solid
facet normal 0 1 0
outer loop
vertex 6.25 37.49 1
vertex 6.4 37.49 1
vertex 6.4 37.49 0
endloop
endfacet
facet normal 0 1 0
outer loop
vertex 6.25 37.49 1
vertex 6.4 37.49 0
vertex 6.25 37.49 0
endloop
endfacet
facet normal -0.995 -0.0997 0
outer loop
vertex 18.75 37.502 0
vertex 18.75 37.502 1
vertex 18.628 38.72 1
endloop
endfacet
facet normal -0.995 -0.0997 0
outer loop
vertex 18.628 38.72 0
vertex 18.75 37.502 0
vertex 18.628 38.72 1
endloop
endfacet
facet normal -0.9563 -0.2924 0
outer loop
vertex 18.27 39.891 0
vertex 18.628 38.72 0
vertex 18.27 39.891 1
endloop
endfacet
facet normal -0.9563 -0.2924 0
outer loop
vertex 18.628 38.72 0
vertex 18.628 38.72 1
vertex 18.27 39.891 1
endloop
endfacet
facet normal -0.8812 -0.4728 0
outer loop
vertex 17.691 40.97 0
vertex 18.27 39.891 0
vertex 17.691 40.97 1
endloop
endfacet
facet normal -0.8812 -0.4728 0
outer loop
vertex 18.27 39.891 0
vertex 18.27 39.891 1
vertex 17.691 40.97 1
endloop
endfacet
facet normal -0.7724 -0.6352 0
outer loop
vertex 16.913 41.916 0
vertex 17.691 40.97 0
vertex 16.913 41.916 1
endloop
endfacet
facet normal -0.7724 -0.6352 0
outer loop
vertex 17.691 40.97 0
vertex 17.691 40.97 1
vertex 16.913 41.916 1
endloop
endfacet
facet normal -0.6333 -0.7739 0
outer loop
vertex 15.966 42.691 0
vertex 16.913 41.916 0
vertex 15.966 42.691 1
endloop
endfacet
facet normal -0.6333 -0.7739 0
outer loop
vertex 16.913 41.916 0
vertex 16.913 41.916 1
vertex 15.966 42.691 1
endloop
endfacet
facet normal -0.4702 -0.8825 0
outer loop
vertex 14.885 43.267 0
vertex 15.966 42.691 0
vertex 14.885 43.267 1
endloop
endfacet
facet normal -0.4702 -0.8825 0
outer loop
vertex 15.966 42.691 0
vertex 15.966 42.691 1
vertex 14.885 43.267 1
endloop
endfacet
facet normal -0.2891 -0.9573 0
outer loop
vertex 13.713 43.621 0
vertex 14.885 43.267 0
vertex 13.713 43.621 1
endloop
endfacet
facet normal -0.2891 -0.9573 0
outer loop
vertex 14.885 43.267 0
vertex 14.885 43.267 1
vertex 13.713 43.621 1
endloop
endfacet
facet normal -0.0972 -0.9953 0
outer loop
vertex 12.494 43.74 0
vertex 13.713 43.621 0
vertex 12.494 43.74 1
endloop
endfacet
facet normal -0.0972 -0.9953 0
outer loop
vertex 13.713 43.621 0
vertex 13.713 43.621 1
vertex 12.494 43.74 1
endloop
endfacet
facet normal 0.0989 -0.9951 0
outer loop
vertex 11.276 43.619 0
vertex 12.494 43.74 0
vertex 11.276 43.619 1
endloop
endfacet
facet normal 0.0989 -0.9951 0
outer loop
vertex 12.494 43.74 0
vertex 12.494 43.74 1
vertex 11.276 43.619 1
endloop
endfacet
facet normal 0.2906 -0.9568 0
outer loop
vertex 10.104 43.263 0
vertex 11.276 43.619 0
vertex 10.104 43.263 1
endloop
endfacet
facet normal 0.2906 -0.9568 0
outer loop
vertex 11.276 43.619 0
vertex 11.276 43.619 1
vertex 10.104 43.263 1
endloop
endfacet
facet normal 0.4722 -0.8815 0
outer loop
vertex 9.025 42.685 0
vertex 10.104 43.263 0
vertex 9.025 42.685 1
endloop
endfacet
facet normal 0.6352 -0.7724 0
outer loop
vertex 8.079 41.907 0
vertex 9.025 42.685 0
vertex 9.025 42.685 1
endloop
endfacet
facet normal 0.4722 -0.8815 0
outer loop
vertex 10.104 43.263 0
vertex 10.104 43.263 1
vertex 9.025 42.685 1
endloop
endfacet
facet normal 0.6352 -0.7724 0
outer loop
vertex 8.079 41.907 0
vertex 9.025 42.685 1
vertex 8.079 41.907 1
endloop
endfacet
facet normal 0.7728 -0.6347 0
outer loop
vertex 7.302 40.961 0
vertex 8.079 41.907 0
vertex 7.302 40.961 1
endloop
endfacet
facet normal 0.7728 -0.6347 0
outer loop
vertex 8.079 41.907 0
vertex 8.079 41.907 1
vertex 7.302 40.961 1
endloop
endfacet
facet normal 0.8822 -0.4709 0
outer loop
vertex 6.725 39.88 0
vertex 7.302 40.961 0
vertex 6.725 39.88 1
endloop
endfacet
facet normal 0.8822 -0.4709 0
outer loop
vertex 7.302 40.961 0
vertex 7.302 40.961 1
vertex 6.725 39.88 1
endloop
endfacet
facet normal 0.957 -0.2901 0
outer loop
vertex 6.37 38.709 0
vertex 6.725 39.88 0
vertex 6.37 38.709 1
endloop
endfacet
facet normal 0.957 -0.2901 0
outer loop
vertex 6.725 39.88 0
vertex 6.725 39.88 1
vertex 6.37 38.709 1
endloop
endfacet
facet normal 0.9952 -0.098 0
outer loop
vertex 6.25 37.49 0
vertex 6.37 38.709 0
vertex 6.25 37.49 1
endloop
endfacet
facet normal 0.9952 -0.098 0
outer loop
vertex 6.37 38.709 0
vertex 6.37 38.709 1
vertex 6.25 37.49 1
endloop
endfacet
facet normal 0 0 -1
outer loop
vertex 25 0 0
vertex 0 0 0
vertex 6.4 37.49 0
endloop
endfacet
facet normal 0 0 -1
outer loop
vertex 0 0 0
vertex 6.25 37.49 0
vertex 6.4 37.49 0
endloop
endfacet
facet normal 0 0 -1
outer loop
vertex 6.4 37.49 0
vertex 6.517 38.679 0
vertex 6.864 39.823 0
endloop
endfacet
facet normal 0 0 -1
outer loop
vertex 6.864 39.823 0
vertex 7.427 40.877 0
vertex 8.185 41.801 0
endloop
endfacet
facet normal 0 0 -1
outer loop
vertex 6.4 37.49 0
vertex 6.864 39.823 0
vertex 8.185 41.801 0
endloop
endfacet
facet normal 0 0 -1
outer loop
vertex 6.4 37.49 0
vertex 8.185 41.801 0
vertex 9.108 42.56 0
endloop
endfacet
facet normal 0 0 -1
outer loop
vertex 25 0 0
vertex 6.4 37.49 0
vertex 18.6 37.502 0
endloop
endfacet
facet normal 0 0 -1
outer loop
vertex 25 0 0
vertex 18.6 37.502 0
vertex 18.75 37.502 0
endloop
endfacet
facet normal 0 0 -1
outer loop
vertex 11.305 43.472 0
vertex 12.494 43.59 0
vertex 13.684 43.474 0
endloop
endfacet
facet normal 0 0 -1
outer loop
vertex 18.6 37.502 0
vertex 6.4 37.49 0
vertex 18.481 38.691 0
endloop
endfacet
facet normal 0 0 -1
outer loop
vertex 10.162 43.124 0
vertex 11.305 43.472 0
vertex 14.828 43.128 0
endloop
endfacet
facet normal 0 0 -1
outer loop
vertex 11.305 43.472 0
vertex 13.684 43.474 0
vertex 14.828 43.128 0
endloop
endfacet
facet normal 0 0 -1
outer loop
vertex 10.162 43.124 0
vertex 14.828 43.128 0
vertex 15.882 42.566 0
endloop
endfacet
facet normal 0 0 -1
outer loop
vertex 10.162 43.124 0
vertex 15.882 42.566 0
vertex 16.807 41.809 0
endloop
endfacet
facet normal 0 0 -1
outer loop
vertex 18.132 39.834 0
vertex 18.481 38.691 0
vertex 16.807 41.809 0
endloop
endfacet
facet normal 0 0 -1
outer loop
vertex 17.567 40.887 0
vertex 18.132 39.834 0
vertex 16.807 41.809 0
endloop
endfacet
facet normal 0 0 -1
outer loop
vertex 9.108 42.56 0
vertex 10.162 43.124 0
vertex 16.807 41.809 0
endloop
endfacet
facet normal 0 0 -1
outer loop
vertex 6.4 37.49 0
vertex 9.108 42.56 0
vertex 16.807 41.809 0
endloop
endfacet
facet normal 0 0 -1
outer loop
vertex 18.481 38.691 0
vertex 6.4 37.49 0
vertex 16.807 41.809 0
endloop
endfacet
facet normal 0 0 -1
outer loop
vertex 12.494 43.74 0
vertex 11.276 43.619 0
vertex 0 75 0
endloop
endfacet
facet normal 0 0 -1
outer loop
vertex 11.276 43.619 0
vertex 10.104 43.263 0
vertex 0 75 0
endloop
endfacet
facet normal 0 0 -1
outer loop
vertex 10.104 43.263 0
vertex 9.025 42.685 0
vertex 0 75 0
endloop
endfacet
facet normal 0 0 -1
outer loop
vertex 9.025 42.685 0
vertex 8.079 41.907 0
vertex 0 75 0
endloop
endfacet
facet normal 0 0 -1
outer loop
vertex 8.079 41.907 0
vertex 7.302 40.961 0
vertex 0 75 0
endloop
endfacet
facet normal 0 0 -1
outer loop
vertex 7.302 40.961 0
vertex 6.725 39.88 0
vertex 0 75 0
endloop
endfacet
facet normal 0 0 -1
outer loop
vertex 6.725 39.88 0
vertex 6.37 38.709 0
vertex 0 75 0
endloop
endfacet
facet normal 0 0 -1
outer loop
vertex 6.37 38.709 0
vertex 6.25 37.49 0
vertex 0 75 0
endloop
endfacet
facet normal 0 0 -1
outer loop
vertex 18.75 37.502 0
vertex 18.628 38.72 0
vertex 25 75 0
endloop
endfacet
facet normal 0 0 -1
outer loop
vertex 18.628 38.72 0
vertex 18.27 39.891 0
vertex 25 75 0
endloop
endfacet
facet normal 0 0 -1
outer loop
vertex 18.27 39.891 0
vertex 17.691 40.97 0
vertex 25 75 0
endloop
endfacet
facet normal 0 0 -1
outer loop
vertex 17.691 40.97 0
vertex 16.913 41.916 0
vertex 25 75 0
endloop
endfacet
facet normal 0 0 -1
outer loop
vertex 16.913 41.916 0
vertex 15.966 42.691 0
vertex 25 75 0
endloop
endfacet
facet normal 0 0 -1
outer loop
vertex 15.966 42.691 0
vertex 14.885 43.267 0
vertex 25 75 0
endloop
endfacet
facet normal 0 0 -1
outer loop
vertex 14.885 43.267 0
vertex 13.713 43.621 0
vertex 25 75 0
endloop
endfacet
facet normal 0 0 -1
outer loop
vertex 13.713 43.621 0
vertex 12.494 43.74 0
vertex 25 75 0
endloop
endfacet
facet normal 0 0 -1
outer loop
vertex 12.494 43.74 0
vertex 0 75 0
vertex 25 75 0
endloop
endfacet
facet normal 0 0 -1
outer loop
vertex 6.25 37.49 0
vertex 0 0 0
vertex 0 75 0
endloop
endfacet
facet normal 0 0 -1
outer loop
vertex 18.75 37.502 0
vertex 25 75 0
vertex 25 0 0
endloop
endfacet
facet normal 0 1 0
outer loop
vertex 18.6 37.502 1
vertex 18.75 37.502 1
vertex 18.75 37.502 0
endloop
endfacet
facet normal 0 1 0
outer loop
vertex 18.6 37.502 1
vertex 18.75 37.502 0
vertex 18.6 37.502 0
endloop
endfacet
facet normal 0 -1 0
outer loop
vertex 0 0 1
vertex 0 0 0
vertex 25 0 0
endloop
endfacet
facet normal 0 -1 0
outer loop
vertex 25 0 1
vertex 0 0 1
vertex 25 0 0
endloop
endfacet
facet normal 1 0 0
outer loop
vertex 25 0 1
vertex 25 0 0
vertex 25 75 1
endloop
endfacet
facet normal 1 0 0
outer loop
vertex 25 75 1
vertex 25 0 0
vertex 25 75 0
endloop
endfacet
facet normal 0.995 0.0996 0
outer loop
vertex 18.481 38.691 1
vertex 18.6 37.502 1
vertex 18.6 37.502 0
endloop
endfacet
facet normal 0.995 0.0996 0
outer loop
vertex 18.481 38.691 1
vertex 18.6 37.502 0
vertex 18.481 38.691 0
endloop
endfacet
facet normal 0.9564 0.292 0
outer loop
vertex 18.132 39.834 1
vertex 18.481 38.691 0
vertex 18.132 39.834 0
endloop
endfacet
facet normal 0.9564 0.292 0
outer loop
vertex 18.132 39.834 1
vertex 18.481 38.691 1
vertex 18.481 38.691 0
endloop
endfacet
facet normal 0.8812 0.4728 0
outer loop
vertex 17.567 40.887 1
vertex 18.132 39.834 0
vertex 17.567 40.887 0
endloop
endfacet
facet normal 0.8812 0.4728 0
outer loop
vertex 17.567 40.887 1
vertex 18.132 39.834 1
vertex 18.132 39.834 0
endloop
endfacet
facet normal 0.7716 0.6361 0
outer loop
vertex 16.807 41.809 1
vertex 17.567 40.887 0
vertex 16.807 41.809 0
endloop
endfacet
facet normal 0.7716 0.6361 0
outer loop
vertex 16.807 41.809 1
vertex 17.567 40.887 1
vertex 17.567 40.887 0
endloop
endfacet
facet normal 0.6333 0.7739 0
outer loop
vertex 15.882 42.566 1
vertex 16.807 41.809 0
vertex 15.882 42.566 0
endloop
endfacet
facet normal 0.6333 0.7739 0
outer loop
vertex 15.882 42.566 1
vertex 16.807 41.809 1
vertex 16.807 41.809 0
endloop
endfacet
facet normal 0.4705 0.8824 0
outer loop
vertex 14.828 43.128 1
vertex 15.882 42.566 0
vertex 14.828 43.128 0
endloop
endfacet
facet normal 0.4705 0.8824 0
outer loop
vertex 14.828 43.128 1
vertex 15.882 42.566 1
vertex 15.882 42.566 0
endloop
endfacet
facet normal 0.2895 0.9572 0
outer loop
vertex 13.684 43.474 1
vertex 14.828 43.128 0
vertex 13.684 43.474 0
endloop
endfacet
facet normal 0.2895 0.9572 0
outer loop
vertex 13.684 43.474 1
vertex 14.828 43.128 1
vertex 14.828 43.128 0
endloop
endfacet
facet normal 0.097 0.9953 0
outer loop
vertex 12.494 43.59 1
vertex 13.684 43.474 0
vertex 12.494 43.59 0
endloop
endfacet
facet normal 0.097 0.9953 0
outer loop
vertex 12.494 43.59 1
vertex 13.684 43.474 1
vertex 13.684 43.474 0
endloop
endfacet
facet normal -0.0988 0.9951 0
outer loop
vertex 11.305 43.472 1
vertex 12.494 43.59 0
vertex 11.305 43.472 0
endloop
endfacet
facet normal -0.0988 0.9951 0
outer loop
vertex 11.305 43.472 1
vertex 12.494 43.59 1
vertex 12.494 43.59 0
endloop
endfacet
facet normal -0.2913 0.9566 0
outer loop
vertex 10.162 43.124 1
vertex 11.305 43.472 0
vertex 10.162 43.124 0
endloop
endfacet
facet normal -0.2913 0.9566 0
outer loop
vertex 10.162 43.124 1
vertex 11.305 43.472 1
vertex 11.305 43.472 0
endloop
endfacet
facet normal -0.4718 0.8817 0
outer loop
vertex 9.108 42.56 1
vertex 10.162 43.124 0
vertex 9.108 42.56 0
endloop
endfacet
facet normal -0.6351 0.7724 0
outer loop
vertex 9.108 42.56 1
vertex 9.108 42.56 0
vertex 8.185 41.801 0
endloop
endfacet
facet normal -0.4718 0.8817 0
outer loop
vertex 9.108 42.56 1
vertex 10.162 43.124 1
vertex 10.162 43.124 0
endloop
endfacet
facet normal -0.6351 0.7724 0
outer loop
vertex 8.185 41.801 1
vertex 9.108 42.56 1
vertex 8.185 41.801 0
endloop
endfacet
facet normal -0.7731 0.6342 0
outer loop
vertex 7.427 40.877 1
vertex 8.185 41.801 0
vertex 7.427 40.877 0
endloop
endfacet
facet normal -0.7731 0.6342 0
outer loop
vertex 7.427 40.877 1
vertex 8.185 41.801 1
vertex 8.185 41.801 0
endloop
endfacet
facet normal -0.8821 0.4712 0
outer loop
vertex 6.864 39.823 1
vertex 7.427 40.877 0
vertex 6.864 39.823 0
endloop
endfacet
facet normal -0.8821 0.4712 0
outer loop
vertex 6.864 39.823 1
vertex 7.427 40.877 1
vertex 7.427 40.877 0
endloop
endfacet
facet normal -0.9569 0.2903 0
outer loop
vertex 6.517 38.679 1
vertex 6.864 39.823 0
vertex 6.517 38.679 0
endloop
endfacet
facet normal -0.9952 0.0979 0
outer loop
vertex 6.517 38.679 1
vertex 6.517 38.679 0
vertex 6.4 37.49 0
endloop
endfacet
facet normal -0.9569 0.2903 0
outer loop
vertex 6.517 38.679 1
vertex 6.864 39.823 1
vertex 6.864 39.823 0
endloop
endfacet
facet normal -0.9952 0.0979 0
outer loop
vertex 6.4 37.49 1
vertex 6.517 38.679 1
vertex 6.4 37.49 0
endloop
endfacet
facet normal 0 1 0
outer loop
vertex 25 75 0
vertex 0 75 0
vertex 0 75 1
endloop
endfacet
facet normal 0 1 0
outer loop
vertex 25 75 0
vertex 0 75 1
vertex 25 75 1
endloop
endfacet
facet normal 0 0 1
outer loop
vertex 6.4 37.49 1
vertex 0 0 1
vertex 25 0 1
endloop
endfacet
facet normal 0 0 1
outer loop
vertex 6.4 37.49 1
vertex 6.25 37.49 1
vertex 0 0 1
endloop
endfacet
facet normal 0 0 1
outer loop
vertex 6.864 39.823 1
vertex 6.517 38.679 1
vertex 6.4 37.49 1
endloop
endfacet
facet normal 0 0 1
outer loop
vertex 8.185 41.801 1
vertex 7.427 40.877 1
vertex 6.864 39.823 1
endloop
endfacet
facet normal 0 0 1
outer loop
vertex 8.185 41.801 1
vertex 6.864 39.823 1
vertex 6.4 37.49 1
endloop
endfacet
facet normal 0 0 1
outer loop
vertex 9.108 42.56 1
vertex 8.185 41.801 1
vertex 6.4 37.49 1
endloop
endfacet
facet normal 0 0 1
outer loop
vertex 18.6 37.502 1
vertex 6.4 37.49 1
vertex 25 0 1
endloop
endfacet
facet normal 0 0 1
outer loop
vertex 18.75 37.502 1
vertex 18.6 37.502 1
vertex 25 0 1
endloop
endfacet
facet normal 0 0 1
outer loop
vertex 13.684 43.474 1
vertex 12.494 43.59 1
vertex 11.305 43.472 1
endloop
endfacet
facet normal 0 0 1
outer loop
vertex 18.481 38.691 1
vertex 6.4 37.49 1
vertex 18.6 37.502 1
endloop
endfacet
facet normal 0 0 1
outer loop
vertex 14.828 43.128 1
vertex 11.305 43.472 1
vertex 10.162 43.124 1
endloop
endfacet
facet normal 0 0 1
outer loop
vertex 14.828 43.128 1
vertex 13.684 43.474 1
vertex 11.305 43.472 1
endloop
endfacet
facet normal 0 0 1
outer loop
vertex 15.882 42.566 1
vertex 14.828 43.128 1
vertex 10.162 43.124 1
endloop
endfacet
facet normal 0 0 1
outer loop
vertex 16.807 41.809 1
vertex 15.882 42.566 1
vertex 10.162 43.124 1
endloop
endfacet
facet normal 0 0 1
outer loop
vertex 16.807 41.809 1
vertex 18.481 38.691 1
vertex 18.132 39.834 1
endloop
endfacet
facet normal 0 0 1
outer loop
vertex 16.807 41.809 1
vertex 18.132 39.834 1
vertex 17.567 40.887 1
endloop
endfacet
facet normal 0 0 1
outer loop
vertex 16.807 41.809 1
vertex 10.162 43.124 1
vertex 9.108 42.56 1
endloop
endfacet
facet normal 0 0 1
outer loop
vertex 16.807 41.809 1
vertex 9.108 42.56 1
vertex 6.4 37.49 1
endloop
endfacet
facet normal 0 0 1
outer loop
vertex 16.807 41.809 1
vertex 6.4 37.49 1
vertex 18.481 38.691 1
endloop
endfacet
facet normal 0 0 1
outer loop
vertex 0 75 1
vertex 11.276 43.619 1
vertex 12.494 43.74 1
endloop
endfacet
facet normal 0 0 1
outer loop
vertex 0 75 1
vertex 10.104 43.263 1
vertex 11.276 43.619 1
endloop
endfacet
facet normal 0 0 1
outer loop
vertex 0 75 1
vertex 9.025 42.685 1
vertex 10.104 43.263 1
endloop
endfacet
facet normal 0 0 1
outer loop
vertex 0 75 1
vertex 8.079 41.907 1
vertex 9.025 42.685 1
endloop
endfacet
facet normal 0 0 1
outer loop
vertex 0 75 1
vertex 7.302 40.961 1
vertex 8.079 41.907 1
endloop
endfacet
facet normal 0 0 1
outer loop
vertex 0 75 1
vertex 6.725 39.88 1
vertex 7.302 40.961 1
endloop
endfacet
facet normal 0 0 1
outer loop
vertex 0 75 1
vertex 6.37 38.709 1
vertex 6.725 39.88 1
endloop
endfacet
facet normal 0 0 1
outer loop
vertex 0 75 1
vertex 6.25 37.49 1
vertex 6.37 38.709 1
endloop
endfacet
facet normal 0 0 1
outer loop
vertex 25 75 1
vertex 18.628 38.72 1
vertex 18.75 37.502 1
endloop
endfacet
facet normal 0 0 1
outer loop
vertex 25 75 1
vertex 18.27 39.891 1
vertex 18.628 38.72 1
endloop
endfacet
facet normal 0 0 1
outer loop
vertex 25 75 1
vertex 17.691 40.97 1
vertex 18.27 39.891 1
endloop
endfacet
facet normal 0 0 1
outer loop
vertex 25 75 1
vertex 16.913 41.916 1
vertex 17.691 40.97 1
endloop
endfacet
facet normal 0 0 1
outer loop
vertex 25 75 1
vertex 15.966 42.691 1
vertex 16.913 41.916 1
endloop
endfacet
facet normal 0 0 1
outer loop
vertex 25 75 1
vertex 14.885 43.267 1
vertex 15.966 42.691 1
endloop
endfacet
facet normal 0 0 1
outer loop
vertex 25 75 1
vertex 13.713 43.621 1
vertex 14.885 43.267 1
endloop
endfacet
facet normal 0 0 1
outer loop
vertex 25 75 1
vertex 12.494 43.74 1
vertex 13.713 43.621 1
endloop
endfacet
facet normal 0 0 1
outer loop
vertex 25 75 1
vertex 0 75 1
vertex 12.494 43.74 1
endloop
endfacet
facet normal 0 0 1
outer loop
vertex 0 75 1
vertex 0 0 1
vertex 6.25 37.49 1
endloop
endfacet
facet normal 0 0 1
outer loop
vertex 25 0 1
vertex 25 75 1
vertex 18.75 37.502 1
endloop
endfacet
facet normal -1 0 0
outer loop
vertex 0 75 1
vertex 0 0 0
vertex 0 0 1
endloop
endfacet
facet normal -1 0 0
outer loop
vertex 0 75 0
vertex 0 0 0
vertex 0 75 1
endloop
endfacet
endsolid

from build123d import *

# Parameters (mm, degrees)
PAD004_DEPTH      = 2
PAD004_DEPTH_BACK = 2
SKETCH020_W       = 25
SKETCH020_H       = 75
PAD019_DEPTH      = 1


with BuildPart() as body004:
    # Sketch005 → Pad004 (new body, two sides)
    with BuildSketch(Plane.XY) as pad004_sk:
        with BuildLine():
            ThreePointArc((18.749989, 37.50156), (12.49422, 43.740026), (6.25, 37.49))
            Line((6.4, 37.49), (6.25, 37.49))
            ThreePointArc((18.599989, 37.50156), (12.49422, 43.590026), (6.4, 37.49))
            Line((18.749989, 37.50156), (18.599989, 37.50156))
        make_face()
    extrude(amount=PAD004_DEPTH)
    extrude(pad004_sk.sketch, amount=-PAD004_DEPTH_BACK)


with BuildPart() as body018:
    # Sketch020 → Pad019 (new body)
    with BuildSketch(Plane.XY):
        with Locations((12.5, 37.5)):
            Rectangle(SKETCH020_W, SKETCH020_H)
    extrude(amount=PAD019_DEPTH)

    # Boolean003: cut Body004
    add(body004.part, mode=Mode.SUBTRACT)


solid = body018.part
